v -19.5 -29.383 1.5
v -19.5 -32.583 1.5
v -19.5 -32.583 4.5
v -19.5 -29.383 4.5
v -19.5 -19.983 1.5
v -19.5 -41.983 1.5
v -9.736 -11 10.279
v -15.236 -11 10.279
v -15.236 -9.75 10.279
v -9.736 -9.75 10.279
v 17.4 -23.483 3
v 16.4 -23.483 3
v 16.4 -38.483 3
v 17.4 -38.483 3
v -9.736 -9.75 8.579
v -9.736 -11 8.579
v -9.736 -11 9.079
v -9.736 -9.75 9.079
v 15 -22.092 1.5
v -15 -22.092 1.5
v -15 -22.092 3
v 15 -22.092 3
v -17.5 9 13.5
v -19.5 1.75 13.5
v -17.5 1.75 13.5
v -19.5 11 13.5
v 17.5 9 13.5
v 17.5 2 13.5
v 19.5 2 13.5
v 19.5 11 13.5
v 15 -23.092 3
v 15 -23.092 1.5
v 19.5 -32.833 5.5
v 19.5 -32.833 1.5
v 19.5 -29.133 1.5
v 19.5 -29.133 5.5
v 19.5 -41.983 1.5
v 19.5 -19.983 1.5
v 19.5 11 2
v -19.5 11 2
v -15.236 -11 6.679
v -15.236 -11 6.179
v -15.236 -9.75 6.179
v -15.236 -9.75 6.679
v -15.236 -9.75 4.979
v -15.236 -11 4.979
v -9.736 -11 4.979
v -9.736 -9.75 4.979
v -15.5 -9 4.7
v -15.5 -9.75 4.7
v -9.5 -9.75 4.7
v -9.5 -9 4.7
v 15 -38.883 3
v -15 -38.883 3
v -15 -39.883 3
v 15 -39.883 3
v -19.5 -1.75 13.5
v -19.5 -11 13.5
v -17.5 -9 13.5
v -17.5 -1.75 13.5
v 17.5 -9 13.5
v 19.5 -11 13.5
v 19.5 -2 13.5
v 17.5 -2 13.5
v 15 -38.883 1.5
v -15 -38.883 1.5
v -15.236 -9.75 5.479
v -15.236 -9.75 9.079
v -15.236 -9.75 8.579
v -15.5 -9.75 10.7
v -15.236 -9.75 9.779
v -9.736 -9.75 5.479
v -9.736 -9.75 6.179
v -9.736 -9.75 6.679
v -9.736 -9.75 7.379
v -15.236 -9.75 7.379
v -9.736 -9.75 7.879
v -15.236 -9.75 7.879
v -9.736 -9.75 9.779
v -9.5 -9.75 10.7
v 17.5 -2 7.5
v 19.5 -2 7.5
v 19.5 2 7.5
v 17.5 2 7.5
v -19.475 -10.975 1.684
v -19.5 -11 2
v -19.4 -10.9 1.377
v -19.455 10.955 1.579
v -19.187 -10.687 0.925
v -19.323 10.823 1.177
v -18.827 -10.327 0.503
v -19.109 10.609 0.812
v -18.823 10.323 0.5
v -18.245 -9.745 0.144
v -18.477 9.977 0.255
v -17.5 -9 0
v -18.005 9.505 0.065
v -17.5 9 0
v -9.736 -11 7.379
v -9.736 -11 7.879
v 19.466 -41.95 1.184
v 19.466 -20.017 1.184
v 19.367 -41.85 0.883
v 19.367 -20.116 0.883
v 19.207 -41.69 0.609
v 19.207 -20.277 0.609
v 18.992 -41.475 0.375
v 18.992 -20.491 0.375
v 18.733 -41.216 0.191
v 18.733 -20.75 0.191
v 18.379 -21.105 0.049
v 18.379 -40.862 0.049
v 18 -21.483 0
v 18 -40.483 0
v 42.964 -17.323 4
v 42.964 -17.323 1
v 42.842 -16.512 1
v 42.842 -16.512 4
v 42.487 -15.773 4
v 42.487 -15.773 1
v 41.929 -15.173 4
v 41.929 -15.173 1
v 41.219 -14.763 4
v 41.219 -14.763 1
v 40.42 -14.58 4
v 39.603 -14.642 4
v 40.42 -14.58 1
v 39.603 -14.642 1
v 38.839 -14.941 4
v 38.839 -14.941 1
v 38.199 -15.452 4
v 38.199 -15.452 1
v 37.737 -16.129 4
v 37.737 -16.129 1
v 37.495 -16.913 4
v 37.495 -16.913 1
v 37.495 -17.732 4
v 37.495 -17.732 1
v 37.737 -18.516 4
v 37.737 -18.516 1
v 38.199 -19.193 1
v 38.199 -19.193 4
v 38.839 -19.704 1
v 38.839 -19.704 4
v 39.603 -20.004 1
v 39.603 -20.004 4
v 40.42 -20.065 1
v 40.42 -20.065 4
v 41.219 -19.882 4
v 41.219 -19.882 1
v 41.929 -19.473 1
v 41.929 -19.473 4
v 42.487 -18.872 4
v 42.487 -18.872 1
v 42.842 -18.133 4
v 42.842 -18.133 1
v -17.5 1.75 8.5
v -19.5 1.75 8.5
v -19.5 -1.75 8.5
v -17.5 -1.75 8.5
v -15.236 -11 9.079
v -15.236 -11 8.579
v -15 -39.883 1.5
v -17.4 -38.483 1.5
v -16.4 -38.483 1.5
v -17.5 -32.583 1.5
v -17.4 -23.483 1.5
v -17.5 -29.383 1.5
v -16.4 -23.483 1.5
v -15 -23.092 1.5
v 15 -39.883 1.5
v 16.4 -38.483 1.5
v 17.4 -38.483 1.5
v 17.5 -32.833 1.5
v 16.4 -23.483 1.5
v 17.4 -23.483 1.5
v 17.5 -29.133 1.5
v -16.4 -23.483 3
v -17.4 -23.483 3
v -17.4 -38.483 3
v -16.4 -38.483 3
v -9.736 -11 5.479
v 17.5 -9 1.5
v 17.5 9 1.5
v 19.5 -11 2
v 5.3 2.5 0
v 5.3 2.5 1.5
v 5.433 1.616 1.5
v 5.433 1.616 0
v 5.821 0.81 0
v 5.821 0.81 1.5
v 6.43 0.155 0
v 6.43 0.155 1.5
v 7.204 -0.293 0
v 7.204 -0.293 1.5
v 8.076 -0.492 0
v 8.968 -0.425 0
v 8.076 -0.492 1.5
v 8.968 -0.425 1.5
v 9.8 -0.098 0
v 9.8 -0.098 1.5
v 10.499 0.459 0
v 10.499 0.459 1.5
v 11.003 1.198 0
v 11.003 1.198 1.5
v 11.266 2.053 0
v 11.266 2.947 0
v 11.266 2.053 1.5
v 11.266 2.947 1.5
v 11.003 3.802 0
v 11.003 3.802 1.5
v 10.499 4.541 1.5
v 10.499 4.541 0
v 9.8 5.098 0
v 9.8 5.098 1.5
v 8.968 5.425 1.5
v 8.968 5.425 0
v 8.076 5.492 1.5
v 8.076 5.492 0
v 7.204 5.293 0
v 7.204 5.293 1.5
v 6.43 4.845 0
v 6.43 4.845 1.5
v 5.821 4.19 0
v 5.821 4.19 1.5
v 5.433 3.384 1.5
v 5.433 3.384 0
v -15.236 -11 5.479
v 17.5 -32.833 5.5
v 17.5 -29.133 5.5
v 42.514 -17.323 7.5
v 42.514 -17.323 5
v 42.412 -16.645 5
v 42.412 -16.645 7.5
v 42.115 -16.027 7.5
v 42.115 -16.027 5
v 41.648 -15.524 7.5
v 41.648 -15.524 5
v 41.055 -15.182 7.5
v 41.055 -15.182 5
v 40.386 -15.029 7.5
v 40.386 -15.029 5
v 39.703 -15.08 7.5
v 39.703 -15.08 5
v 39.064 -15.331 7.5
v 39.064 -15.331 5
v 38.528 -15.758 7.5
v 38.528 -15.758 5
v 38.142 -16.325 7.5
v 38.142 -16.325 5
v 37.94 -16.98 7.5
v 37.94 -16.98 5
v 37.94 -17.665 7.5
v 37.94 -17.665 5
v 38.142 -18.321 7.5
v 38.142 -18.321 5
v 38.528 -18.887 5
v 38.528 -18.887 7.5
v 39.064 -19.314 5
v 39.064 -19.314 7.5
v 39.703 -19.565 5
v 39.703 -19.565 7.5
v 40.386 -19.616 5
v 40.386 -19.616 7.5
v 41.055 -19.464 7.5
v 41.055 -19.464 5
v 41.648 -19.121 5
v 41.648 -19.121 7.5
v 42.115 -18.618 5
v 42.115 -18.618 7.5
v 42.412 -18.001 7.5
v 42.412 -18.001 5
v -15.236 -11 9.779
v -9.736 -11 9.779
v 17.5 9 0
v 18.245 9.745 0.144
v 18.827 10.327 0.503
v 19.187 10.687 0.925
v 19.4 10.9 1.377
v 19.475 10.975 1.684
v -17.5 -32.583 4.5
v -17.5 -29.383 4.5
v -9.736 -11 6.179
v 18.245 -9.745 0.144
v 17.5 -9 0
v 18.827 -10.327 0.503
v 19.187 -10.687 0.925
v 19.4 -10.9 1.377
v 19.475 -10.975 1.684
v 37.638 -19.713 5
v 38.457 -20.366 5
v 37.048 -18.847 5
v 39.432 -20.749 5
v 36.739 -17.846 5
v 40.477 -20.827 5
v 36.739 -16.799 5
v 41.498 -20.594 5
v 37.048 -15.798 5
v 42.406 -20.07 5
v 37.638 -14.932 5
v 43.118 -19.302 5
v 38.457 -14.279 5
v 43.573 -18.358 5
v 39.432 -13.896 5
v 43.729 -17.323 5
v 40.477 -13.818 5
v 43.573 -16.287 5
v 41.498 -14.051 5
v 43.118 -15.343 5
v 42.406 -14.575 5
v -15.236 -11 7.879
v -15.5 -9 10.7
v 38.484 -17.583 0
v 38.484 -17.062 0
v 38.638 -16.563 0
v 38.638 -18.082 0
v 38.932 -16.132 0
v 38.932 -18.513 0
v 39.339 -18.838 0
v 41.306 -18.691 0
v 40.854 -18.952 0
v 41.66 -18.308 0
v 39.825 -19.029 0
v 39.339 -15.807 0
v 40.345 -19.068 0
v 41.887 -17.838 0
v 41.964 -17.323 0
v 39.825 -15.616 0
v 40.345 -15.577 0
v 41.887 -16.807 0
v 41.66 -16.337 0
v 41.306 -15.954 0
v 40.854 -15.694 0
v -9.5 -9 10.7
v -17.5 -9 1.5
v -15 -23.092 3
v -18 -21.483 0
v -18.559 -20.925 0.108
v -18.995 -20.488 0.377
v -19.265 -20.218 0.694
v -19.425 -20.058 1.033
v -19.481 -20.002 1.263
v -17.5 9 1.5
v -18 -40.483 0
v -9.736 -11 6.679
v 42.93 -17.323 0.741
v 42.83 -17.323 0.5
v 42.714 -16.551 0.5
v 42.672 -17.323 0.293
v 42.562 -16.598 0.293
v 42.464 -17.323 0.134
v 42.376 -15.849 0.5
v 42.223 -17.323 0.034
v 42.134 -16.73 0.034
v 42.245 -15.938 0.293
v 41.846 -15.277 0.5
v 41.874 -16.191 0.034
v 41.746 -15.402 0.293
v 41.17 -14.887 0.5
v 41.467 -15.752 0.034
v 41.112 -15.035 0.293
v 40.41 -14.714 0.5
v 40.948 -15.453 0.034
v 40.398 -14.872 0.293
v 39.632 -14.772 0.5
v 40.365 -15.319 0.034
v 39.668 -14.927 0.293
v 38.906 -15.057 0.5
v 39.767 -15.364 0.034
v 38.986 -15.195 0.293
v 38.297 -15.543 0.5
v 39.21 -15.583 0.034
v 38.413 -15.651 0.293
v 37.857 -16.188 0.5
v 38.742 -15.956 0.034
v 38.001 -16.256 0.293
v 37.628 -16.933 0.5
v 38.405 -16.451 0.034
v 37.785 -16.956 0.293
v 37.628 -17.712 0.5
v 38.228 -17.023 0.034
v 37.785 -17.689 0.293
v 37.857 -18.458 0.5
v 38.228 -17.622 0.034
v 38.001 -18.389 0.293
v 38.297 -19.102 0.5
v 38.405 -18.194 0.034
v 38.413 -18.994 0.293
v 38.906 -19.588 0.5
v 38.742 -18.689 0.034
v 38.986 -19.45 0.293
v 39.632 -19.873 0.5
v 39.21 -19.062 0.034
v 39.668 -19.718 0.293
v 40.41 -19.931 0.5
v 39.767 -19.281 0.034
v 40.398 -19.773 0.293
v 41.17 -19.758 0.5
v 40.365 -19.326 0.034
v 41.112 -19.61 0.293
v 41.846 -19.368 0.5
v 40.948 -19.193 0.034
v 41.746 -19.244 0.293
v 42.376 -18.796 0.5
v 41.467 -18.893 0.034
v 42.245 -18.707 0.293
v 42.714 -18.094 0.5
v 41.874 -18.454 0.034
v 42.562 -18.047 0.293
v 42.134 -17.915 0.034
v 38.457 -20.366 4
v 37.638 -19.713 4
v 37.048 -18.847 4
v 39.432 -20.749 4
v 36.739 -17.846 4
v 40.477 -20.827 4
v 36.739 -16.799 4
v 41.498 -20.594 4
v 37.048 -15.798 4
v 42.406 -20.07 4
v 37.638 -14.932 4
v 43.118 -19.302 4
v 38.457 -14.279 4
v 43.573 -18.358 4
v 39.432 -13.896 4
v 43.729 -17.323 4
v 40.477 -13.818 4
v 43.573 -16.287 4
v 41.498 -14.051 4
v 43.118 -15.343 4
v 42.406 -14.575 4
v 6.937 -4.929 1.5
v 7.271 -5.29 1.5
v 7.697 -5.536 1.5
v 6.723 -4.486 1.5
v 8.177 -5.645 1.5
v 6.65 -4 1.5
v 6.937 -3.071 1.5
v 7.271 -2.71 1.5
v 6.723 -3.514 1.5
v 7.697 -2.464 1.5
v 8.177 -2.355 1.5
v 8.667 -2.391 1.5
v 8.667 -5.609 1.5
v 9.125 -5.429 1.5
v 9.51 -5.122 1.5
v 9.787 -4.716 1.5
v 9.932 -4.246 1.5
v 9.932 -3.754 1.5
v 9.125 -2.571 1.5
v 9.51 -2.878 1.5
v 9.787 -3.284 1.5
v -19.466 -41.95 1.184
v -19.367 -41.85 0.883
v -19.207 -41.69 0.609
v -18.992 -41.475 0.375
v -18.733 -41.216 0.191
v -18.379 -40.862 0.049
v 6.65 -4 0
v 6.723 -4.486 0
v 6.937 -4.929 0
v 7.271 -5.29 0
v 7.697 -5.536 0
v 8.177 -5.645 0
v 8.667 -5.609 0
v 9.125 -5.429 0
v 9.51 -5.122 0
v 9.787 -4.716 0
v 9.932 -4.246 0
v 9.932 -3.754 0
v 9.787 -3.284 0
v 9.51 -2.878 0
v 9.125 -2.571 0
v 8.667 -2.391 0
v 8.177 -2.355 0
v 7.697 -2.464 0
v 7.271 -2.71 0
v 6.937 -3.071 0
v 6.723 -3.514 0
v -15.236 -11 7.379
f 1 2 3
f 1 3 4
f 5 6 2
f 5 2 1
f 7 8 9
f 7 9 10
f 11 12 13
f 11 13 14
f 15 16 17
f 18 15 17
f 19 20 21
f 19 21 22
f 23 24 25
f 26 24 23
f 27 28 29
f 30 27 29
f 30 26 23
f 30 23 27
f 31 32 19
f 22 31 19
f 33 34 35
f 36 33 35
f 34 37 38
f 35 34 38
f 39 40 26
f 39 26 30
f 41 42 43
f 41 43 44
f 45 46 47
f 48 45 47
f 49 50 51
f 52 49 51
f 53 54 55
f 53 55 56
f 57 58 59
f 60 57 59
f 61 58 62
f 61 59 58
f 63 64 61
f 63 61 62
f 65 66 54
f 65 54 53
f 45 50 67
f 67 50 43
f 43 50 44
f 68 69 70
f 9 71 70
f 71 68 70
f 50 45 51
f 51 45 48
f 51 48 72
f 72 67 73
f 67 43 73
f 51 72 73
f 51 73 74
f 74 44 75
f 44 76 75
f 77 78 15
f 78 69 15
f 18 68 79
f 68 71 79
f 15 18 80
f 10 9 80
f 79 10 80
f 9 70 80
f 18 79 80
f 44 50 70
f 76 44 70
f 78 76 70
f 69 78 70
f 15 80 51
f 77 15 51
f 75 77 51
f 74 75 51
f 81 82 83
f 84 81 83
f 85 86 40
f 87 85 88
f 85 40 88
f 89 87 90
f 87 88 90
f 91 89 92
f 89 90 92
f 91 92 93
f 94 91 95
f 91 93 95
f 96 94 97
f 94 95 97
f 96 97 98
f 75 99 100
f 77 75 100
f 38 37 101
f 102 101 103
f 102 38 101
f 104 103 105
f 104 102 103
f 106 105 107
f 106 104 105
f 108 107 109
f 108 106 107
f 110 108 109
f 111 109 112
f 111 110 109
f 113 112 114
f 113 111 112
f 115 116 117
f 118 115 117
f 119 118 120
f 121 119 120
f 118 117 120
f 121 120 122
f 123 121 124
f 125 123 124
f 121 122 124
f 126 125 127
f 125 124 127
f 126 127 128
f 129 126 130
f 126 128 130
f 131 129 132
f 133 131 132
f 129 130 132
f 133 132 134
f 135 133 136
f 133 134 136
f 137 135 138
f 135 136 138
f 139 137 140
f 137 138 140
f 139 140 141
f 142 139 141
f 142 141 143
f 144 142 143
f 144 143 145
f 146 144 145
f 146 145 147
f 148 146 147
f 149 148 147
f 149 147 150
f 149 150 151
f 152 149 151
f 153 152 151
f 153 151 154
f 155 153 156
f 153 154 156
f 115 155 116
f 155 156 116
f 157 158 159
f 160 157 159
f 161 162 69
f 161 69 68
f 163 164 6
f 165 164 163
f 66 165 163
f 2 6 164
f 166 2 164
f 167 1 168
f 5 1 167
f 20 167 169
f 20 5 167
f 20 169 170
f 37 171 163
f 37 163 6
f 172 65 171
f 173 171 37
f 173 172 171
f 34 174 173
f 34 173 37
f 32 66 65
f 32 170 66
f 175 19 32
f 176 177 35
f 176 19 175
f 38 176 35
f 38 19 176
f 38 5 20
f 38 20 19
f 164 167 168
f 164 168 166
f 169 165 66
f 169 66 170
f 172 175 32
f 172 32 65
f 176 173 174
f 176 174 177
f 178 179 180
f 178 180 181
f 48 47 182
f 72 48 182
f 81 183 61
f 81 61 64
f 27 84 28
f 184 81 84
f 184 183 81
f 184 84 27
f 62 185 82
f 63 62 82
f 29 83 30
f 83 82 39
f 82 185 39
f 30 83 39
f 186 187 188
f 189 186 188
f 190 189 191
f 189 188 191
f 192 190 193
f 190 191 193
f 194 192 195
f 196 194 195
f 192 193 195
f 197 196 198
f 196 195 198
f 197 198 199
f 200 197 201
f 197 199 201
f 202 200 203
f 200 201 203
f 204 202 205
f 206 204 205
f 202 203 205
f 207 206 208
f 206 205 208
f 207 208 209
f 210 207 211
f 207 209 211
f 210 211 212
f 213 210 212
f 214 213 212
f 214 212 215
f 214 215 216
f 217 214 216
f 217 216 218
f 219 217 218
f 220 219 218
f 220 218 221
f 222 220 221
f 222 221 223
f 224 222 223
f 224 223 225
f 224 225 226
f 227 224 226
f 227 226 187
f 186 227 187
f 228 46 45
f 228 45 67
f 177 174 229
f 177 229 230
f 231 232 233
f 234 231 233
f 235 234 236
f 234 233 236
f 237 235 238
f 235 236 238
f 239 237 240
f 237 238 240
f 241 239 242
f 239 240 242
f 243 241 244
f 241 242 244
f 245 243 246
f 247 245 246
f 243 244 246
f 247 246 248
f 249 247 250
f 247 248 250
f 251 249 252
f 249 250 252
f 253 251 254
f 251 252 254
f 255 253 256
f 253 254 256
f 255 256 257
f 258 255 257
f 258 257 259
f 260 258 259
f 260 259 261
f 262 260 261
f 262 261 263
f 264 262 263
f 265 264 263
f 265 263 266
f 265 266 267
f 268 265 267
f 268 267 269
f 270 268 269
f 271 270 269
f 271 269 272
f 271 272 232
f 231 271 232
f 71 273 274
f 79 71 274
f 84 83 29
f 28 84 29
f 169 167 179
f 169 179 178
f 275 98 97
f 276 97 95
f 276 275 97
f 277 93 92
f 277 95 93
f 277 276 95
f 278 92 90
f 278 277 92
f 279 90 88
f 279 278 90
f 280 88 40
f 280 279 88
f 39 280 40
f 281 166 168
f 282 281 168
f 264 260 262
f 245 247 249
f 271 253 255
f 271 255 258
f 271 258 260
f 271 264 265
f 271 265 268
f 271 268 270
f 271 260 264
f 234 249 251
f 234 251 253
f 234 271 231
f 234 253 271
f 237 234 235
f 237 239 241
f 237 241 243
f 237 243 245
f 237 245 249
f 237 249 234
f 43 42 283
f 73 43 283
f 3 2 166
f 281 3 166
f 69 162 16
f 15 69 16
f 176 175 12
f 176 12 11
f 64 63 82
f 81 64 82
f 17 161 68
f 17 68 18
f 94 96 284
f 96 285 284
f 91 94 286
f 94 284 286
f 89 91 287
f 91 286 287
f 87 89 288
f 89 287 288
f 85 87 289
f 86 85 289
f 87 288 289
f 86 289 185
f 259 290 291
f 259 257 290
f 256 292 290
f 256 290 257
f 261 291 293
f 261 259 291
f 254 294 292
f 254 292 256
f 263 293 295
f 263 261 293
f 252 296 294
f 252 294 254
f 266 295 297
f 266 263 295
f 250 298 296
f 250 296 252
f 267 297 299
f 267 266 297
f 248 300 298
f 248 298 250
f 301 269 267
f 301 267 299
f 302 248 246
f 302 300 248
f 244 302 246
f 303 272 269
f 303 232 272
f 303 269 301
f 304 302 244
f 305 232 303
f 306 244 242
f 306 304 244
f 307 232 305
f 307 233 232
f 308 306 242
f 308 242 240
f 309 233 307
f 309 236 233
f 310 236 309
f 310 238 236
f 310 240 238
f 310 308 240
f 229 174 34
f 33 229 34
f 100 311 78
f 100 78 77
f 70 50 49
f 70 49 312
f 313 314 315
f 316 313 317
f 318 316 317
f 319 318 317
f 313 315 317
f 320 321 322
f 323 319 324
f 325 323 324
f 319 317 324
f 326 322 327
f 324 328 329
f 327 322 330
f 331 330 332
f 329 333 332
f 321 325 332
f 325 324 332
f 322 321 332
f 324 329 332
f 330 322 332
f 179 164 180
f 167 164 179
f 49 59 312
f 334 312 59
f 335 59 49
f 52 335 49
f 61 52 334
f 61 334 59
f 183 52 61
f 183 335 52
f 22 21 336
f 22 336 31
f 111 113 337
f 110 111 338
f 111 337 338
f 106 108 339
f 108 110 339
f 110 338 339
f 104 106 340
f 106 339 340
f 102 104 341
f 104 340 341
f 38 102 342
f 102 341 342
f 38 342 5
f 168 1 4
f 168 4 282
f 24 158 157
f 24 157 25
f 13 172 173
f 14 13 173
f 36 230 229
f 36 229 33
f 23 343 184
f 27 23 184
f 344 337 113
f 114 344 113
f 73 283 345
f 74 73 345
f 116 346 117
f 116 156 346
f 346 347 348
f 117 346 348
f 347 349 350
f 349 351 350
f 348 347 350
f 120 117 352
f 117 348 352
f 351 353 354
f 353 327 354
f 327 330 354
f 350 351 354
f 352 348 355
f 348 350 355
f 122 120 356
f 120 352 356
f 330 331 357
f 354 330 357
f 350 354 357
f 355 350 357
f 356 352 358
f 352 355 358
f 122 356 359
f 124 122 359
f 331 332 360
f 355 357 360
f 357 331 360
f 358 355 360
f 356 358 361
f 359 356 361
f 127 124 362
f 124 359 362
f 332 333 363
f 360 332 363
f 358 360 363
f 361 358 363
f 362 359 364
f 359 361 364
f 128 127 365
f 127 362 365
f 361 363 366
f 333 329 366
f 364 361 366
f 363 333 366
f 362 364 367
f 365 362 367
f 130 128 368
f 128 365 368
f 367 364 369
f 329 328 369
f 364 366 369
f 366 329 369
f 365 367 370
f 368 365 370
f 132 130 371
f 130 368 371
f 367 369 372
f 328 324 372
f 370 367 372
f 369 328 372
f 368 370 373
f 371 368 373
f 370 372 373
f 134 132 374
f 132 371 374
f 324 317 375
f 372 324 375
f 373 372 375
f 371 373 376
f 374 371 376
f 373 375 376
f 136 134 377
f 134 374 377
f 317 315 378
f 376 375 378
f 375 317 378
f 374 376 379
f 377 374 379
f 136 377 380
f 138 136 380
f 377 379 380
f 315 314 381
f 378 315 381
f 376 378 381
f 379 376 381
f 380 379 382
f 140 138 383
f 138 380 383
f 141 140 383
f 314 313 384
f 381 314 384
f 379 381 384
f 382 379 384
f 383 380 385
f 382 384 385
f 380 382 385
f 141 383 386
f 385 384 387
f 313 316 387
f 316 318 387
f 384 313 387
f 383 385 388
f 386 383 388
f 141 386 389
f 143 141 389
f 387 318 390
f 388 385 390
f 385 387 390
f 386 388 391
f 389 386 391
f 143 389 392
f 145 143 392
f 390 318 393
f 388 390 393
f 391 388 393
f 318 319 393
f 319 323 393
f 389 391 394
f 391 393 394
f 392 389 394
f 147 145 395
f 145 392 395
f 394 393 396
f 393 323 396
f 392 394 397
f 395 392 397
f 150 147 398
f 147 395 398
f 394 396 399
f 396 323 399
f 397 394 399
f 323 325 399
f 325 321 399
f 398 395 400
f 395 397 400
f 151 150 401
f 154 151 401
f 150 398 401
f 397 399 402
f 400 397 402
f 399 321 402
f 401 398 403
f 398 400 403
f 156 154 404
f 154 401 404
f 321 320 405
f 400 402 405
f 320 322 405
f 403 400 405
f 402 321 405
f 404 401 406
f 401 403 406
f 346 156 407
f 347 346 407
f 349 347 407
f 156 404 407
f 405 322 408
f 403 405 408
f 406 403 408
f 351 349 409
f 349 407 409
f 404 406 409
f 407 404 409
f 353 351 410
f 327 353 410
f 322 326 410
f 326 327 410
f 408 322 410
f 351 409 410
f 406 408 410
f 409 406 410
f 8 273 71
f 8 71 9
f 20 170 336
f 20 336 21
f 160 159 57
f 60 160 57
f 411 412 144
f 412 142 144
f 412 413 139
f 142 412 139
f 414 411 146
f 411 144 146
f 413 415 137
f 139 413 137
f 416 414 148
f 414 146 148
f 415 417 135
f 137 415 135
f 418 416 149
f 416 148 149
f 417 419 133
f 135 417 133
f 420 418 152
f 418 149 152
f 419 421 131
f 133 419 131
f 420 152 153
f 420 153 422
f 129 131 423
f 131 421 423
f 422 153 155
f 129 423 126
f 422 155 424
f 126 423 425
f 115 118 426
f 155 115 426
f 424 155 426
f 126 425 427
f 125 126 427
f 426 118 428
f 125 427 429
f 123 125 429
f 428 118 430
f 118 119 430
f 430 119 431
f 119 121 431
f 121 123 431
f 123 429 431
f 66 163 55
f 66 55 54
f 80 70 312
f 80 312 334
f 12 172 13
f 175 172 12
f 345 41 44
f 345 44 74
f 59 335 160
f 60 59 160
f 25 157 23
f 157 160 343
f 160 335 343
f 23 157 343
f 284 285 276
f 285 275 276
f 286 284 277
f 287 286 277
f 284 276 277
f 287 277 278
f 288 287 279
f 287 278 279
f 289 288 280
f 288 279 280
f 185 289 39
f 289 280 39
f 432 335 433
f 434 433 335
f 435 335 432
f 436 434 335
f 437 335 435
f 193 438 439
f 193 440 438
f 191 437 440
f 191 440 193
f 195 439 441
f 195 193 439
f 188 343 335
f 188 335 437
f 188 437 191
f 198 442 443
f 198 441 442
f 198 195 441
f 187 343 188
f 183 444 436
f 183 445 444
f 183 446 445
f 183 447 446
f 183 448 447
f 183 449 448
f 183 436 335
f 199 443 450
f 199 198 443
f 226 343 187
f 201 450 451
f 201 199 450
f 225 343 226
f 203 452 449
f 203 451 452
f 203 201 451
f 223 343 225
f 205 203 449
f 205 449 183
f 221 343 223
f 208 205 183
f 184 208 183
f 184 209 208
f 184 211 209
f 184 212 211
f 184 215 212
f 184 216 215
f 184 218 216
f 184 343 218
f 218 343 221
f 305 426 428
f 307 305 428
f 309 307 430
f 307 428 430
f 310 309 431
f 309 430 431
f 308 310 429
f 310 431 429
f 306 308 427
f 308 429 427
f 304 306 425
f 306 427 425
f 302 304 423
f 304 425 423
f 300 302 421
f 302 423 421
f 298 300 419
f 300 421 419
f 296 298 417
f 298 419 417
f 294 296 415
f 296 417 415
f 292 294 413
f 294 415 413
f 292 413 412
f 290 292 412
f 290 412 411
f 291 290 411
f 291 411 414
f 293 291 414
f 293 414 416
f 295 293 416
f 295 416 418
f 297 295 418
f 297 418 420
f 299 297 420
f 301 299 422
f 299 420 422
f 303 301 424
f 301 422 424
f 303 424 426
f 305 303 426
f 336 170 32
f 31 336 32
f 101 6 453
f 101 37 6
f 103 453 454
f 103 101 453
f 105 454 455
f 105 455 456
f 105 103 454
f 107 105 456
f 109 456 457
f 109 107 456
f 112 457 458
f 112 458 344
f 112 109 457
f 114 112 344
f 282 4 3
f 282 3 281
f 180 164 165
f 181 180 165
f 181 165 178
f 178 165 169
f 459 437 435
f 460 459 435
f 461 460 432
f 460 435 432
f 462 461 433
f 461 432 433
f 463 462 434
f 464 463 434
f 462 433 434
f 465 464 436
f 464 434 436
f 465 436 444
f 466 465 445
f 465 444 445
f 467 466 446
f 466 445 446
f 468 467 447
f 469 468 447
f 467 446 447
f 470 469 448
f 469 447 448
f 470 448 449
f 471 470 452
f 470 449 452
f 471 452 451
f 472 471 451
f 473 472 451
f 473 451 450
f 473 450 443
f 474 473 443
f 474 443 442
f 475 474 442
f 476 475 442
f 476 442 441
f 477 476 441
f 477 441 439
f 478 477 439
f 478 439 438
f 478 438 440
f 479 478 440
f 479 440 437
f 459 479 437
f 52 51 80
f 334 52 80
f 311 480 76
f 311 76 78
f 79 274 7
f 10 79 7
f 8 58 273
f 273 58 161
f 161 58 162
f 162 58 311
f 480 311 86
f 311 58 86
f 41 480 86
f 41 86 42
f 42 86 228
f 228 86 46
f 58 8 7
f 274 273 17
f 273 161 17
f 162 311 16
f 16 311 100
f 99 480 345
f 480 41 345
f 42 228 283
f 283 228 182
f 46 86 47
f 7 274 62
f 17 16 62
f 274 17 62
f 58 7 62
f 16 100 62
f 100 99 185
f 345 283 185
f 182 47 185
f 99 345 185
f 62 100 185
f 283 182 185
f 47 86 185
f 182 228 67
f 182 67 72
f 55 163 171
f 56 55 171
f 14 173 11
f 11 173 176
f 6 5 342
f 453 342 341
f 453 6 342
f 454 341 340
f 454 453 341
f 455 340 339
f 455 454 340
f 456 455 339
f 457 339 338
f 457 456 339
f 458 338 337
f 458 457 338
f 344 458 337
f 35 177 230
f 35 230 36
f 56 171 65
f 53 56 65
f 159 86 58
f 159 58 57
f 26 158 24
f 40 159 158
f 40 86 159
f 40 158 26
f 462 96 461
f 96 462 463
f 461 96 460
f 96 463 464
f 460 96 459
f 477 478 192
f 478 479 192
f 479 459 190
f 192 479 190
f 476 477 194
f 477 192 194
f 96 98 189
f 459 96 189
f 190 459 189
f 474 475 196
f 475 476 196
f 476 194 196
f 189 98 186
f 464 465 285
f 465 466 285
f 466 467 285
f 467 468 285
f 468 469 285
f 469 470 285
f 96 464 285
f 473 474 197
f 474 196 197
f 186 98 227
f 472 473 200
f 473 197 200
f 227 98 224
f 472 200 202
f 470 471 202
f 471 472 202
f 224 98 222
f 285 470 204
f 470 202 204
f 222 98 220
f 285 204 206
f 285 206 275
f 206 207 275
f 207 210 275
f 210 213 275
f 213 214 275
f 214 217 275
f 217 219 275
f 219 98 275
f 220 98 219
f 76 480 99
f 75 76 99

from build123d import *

# Parameters (mm, degrees)
F0_W      = 35
F0_H      = 18
F1_DEPTH  = 1.5
F0_W_2    = 39
F0_H_2    = 22
F2_DEPTH  = 13.5
F3_D      = 3.3
F3_DEPTH  = 5
F3_TIP    = 0.9914200214
F5_D      = 6
F5_DEPTH  = 5
F5_TIP    = 1.8025818571
F7_R      = 2.3
F8_DEPTH  = 7.5
F7_R_2    = 2.75
F9_DEPTH  = 4
F10_R     = 1
F11_R     = 3.5143854074
F11_R_2   = 2.75
F11_R_3   = 2.3
F12_DEPTH = 1
F14_W     = 6
F14_H     = 6
F15_DEPTH = 0.75
F16_W     = 3.5
F16_H     = 5
F17_DEPTH = 5
F18_W     = 1
F18_H     = 15
F18_W_2   = 30
F18_H_2   = 1
F19_DEPTH = 1.5
F20_DEPTH = 3
F6_W      = 4
F6_H      = 2
F6_H_2    = 4
F21_DEPTH = 5
F18_W_3   = 2
F18_H_3   = 3.7
F22_DEPTH = 5.5
F23_W     = 5.5
F23_H     = 0.5
F24_DEPTH = 5
F18_H_4   = 3.2
F25_DEPTH = 4.5
F26_R     = 2
F27_R     = 1.49999


# Not quite as in the source:
# - a fillet or chamfer is up to 0.001 mm smaller than in the source, because OpenCascade refuses the exact size
# - a feature names something its author has since deleted; it is built from what else it names


with BuildPart() as f1:
    # F0 (on Top) → F1 (new body)
    with BuildSketch(Plane.XY):
        Rectangle(F0_W, F0_H)
    extrude(amount=F1_DEPTH)

    # F0 (on Top) → F2 (join)
    with BuildSketch(Plane.XY):
        Rectangle(F0_W_2, F0_H_2)
        Rectangle(F0_W, F0_H, mode=Mode.SUBTRACT)
    extrude(amount=F2_DEPTH)

    # F3
    with Locations(Plane(origin=(0, 0, 0), x_dir=(1, 0, 0), z_dir=(0, 0, -1))):
        with Locations((8.3, 4)):
            Hole(F3_D / 2, depth=F3_DEPTH)
            with Locations((0, 0, -(F3_DEPTH + F3_TIP / 2))):  # 118° drill point
                Cone(0, F3_D / 2, F3_TIP, mode=Mode.SUBTRACT)

    # F5
    with Locations(Plane(origin=(0, 0, 0), x_dir=(1, 0, 0), z_dir=(0, 0, -1))):
        with Locations((8.3, -2.5)):
            Hole(F5_D / 2, depth=F5_DEPTH)
            with Locations((0, 0, -(F5_DEPTH + F5_TIP / 2))):  # 118° drill point
                Cone(0, F5_D / 2, F5_TIP, mode=Mode.SUBTRACT)

    # F14 (on offset) → F15 (cut, symmetric)
    with BuildSketch(Plane.XZ.offset(9)):
        with Locations((-12.5, 7.7)):
            Rectangle(F14_W, F14_H)
    extrude(amount=F15_DEPTH, both=True, mode=Mode.SUBTRACT)

    # F16 (on face) → F17 (cut)
    with BuildSketch(Plane(origin=(-19.5, 0, 0), x_dir=(0, -1, 0), z_dir=(-1, 0, 0))):
        with Locations((0, 11)):
            Rectangle(F16_W, F16_H)
    extrude(amount=-F17_DEPTH, mode=Mode.SUBTRACT)

    # F6 (on face) → F21 (cut)
    with BuildSketch(Plane.YZ.offset(19.5)):
        with Locations((0, 8.5)):
            Rectangle(F6_W, F6_H)
        with Locations((0, 11.5)):
            Rectangle(F6_W, F6_H_2)
    extrude(amount=-F21_DEPTH, mode=Mode.SUBTRACT)

    # F23 (on face) → F24 (cut)
    with BuildSketch(Plane.XZ.offset(11)):
        with Locations((-12.4855237082, 5.2288122736)):
            Rectangle(F23_W, F23_H)
        with Locations((-12.4855237082, 6.4288122736)):
            Rectangle(F23_W, F23_H)
        with Locations((-12.4855237082, 7.6288122736)):
            Rectangle(F23_W, F23_H)
        with Locations((-12.4855237082, 8.8288122736)):
            Rectangle(F23_W, F23_H)
        with Locations((-12.4855237082, 10.0288122736)):
            Rectangle(F23_W, F23_H)
    extrude(amount=-F24_DEPTH, mode=Mode.SUBTRACT)

    # F26
    f26_edges = [f1.edges().sort_by_distance(p)[0] for p in [
        (0, -11, 0),
        (-19.5, 0, 0),
        (19.5, 0, 0),
        (0, 11, 0),
    ]]
    fillet(f26_edges, radius=F26_R)


with BuildPart() as f8:
    # F7 (on Top) → F8 (new body)
    with BuildSketch(Plane.XY):
        with Locations((40.214437741, -17.3225737277)):
            Circle(F7_R)
    extrude(amount=F8_DEPTH)

    # F7 (on Top) → F9 (join)
    with BuildSketch(Plane.XY):
        with Locations((40.214437741, -17.3225737277)):
            Circle(F7_R_2)
        with Locations((40.214437741, -17.3225737277)):
            Circle(F7_R, mode=Mode.SUBTRACT)
    extrude(amount=F9_DEPTH)

    # F10
    f10_edges = [f8.edges().sort_by_distance(p)[0] for p in [
        (37.464438, -17.322574, 0),
    ]]
    fillet(f10_edges, radius=F10_R)

    # F11 (on face) → F12 (join)
    with BuildSketch(Plane.XY.offset(4)):
        with Locations((40.214437741, -17.3225737277)):
            Circle(F11_R)
        with Locations((40.214437741, -17.3225737277)):
            Circle(F11_R_2, mode=Mode.SUBTRACT)
        with Locations((40.214437741, -17.3225737277)):
            Circle(F11_R_2)
        with Locations((40.214437741, -17.3225737277)):
            Circle(F11_R_3, mode=Mode.SUBTRACT)
    extrude(amount=F12_DEPTH)


with BuildPart() as f19:
    # F18 (on Top) → F19 (new body)
    with BuildSketch(Plane.XY):
        Polygon((-19.5, -41.9833288193), (19.5, -41.9833288193), (19.5, -32.8333288193), (17.5, -32.8333288193), (17.5, -29.1333288193), (19.5, -29.1333288193), (19.5, -19.9833288193), (-19.5, -19.9833288193), (-19.5, -29.3833288193), (-17.5, -29.3833288193), (-17.5, -32.5833288193), (-19.5, -32.5833288193), align=None)
        with Locations((-16.9, -30.9833288193)):
            Rectangle(F18_W, F18_H, mode=Mode.SUBTRACT)
        with Locations((0, -39.3833288193)):
            Rectangle(F18_W_2, F18_H_2, mode=Mode.SUBTRACT)
        with Locations((16.9, -30.9833288193)):
            Rectangle(F18_W, F18_H, mode=Mode.SUBTRACT)
        with Locations((0, -22.5915573537)):
            Rectangle(F18_W_2, F18_H_2, mode=Mode.SUBTRACT)
    extrude(amount=F19_DEPTH)

    # F18 (on Top) → F20 (join)
    with BuildSketch(Plane.XY):
        with Locations((0, -22.5915573537)):
            Rectangle(F18_W_2, F18_H_2)
        with Locations((-16.9, -30.9833288193)):
            Rectangle(F18_W, F18_H)
        with Locations((0, -39.3833288193)):
            Rectangle(F18_W_2, F18_H_2)
        with Locations((16.9, -30.9833288193)):
            Rectangle(F18_W, F18_H)
    extrude(amount=F20_DEPTH)

    # F18 (on Top) → F22 (join)
    with BuildSketch(Plane.XY):
        with Locations((18.5, -30.9833288193)):
            Rectangle(F18_W_3, F18_H_3)
    extrude(amount=F22_DEPTH)

    # F18 (on Top) → F25 (join)
    with BuildSketch(Plane.XY):
        with Locations((-18.5, -30.9833288193)):
            Rectangle(F18_W_3, F18_H_4)
    extrude(amount=F25_DEPTH)

    # F27 (radius 1.5 in the source; OpenCascade refuses exactly that, so slightly less here)
    f27_edges = [f19.edges().sort_by_distance(p)[0] for p in [
        (19.5, -30.983329, 0),
        (0, -19.983329, 0),
        (-19.5, -30.983329, 0),
        (0, -41.983329, 0),
    ]]
    fillet(f27_edges, radius=F27_R)


solid = Compound([f1.part, f8.part, f19.part])
